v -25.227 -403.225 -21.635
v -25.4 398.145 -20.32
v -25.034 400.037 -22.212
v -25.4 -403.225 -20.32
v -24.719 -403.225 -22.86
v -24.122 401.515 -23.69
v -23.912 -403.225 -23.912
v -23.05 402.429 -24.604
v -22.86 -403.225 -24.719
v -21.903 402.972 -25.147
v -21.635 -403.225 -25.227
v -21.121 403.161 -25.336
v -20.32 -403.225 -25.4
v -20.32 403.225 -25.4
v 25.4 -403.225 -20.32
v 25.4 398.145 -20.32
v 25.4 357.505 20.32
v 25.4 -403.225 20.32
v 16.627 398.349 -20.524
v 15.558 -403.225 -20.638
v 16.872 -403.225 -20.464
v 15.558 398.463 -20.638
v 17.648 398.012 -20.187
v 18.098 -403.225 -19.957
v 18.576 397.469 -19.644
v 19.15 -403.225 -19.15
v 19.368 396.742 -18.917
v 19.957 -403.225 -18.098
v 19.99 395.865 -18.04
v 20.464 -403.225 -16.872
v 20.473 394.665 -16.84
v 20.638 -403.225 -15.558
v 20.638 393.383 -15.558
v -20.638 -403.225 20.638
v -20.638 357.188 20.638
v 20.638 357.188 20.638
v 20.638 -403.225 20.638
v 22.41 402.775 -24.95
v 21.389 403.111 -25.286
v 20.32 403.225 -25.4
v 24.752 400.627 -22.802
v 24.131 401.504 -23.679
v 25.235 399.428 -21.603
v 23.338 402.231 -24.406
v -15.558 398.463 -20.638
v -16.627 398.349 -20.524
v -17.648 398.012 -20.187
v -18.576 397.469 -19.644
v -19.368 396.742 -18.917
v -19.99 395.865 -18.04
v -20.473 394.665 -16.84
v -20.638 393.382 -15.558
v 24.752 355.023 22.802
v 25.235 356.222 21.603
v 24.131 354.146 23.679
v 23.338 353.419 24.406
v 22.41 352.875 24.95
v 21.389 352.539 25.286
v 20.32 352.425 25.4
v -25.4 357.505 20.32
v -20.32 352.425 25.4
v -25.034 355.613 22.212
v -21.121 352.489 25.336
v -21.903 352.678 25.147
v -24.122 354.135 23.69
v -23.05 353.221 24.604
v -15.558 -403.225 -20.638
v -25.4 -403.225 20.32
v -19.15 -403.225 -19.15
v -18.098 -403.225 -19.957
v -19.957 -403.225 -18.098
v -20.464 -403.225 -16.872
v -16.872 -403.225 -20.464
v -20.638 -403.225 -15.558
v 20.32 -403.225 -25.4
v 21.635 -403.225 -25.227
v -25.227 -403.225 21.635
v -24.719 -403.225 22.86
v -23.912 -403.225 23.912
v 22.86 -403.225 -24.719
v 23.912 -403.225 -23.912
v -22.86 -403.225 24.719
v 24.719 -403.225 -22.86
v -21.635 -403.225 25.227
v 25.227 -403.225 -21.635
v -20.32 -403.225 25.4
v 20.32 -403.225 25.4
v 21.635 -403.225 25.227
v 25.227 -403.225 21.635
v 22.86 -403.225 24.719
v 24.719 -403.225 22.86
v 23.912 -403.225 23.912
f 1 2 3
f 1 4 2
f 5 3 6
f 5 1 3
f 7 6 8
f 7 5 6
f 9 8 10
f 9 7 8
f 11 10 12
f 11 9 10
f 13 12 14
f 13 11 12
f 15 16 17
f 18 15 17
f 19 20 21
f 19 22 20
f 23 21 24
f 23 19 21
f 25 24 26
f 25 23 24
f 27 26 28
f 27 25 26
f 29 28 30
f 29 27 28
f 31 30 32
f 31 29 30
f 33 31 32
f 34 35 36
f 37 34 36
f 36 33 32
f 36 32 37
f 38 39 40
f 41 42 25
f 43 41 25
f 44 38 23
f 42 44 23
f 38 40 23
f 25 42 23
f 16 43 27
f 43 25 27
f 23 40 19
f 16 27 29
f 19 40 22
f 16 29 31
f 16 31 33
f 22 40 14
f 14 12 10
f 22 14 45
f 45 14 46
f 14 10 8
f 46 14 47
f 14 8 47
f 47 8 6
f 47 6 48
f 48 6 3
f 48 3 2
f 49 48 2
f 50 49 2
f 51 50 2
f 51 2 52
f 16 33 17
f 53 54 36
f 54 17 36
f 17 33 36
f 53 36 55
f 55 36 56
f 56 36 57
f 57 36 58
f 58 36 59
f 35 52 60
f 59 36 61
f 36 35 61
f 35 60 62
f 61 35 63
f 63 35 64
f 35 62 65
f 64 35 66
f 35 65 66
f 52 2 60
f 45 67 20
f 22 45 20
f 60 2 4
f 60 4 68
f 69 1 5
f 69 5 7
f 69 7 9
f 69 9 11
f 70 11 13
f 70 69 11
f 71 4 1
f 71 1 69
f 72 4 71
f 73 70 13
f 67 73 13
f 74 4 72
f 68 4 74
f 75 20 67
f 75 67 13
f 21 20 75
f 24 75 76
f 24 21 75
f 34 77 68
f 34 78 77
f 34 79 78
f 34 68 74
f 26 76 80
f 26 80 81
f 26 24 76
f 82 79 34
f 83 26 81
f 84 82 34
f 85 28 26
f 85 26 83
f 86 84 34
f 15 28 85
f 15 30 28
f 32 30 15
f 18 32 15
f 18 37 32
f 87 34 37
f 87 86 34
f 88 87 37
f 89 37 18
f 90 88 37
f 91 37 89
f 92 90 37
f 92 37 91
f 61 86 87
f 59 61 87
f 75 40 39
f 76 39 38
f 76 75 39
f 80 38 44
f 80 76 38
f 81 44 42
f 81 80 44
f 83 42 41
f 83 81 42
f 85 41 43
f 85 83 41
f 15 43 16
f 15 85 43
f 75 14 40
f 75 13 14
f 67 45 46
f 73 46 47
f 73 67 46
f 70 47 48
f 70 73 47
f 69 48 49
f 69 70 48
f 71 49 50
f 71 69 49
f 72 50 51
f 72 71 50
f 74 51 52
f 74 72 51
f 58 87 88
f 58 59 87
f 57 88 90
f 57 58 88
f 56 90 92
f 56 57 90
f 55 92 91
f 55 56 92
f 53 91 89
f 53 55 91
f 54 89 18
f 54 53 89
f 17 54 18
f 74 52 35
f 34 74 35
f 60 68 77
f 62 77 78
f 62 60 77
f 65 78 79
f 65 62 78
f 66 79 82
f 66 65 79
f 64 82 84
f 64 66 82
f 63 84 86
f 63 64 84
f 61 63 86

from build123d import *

# Parameters (mm, degrees)
F0_W     = 50.8
F0_H     = 50.8
F0_W_2   = 41.275
F0_H_2   = 41.275
F1_DEPTH = 403.225
F3_DEPTH = 50.8
F4_R     = 5.08


with BuildPart() as f1:
    # F0 (on Front) → F1 (new body, symmetric)
    with BuildSketch(Plane.XZ):
        Rectangle(F0_W, F0_H)
        Rectangle(F0_W_2, F0_H_2, mode=Mode.SUBTRACT)
    extrude(amount=F1_DEPTH, both=True)

    # F2 (on face) → F3 (cut)
    with BuildSketch(Plane(origin=(-25.4, 0, 0), x_dir=(0, -1, 0), z_dir=(-1, 0, 0))):
        Polygon((-352.425, 25.4), (-403.225, 25.4), (-403.225, -25.4), align=None)
    extrude(amount=-F3_DEPTH, mode=Mode.SUBTRACT)

    # F4
    f4_edges = [f1.edges().sort_by_distance(p)[0] for p in [
        (-25.4, -25.4, 25.4),
        (25.4, -25.4, 25.4),
        (20.6375, -2.38125, -20.6375),
        (-20.6375, -2.38125, -20.6375),
        (-25.4, 0, -25.4),
        (25.4, 0, -25.4),
    ]]
    fillet(f4_edges, radius=F4_R)


solid = f1.part
